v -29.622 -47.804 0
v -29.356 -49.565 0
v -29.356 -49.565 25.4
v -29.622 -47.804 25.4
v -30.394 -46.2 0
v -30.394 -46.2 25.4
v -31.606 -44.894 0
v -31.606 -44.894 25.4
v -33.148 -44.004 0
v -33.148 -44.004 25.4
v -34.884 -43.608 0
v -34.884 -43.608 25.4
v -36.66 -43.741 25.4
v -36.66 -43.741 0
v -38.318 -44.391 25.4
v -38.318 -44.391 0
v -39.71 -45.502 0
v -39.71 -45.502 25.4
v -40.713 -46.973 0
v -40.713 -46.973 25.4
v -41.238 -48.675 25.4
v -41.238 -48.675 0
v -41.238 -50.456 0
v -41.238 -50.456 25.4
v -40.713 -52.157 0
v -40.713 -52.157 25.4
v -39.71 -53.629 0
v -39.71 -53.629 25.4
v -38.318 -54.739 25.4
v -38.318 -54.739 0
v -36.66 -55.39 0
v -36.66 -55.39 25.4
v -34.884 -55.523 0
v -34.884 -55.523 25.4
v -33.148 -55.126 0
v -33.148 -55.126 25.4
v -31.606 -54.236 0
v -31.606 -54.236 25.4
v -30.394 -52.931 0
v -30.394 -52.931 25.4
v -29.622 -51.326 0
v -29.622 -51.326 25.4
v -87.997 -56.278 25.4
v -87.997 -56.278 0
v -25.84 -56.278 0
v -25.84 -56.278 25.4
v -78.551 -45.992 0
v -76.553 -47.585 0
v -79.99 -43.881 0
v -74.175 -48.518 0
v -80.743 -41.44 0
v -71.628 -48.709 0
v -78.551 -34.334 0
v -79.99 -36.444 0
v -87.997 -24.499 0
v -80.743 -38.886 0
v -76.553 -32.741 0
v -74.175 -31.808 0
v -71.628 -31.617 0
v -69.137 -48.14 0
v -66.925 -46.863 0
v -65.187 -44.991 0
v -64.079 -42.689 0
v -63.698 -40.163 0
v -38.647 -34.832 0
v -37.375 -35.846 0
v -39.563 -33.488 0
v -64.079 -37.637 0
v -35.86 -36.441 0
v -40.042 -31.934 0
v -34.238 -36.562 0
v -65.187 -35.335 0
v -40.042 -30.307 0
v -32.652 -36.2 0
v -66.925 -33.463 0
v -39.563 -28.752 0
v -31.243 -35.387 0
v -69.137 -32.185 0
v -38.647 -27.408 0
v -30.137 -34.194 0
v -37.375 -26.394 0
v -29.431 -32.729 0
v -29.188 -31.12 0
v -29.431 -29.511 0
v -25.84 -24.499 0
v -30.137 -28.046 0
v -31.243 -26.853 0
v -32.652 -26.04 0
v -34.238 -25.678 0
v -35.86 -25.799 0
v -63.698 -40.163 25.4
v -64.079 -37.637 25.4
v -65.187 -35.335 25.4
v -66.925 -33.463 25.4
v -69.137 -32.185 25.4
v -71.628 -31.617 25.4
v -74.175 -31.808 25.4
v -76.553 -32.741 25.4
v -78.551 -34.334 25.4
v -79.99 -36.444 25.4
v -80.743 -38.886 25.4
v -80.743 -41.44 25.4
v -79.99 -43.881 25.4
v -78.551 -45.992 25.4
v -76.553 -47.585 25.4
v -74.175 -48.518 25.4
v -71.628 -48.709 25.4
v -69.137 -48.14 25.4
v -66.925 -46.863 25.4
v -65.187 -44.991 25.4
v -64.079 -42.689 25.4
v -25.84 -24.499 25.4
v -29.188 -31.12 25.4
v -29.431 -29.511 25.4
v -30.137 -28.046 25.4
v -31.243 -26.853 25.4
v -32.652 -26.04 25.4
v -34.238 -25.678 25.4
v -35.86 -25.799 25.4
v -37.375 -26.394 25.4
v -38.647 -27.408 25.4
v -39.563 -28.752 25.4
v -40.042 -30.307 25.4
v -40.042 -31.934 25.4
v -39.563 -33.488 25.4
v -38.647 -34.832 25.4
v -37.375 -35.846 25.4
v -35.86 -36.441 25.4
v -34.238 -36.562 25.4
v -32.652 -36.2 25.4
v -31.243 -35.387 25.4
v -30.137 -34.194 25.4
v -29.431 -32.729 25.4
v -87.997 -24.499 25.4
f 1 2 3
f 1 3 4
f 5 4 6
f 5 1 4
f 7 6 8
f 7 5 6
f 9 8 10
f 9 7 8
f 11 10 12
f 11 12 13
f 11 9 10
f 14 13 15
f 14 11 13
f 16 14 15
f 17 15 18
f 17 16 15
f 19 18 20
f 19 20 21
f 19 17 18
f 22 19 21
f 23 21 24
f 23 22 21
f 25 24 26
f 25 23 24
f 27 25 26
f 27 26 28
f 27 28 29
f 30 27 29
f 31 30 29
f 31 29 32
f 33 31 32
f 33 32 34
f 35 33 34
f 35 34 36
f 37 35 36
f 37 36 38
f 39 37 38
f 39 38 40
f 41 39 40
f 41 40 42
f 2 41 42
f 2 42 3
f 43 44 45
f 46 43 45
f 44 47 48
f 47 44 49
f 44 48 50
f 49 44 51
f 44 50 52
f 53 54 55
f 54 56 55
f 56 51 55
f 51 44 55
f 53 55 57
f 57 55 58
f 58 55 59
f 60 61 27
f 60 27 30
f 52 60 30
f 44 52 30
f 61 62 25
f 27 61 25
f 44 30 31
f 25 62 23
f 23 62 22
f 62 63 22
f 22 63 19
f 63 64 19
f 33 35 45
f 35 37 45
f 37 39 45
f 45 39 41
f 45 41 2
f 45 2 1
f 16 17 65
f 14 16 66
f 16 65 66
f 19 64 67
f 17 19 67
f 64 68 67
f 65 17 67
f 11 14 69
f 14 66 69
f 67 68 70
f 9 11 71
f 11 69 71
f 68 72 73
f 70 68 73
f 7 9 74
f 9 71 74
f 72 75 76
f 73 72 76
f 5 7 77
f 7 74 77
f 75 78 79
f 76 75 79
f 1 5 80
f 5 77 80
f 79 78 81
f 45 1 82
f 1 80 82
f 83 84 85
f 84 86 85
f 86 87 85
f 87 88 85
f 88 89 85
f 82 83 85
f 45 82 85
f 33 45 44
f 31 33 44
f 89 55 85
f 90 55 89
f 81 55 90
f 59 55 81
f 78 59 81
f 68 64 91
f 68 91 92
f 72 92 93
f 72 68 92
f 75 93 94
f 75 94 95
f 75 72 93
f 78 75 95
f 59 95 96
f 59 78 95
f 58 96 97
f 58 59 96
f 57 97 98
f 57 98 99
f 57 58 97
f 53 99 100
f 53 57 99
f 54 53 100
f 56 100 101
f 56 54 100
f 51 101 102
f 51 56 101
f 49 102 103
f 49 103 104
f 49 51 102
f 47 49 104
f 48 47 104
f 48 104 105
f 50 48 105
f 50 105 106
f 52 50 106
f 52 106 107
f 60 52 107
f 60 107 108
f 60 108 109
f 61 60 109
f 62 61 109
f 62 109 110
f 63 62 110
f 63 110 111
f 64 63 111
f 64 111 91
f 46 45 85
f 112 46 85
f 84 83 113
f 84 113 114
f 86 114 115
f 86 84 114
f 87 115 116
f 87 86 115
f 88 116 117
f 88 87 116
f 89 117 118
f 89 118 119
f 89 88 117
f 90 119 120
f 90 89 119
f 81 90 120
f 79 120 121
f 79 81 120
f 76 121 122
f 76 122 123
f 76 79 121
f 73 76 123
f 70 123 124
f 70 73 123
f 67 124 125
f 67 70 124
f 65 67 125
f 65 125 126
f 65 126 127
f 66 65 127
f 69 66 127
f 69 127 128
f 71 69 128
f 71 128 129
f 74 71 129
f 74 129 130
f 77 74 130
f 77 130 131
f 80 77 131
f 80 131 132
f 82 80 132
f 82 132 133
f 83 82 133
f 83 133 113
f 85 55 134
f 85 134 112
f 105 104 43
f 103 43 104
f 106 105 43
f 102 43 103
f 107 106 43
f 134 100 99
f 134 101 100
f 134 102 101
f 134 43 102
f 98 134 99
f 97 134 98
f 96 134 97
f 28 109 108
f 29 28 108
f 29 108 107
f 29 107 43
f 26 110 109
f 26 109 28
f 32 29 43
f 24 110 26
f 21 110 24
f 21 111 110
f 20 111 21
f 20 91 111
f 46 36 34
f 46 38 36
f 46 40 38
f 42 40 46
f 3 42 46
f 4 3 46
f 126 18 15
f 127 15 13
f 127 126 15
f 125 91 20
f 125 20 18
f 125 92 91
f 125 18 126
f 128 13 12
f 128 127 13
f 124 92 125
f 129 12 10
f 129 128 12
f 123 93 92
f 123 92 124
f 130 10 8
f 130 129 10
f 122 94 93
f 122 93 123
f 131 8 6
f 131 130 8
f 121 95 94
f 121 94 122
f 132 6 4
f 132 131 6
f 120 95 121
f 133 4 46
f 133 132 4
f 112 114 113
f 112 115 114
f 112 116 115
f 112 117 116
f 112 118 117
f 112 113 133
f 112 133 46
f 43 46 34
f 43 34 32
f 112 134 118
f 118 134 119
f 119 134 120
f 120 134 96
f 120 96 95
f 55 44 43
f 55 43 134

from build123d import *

# Parameters (mm, degrees)
F0_W     = 62.156647
F0_H     = 31.778897
F0_R     = 5.974125
F0_R_2   = 8.570031
F0_R_3   = 5.457517
F1_DEPTH = 6.35
F2_DEPTH = 25.4


with BuildPart() as f1:
    # F0 (on Top) → F1 (new body)
    with BuildSketch(Plane.XY):
        with Locations((-56.918233, -40.388333)):
            Rectangle(F0_W, F0_H)
        with Locations((-35.330459, -49.565207)):
            Circle(F0_R, mode=Mode.SUBTRACT)
        with Locations((-72.268285, -40.162876)):
            Circle(F0_R_2, mode=Mode.SUBTRACT)
        with Locations((-34.6459, -31.120101)):
            Circle(F0_R_3, mode=Mode.SUBTRACT)
    extrude(amount=F1_DEPTH)

    # F0 (on Top) → F2 (join)
    with BuildSketch(Plane.XY):
        with Locations((-56.918233, -40.388333)):
            Rectangle(F0_W, F0_H)
        with Locations((-35.330459, -49.565207)):
            Circle(F0_R, mode=Mode.SUBTRACT)
        with Locations((-72.268285, -40.162876)):
            Circle(F0_R_2, mode=Mode.SUBTRACT)
        with Locations((-34.6459, -31.120101)):
            Circle(F0_R_3, mode=Mode.SUBTRACT)
    extrude(amount=F2_DEPTH)


solid = f1.part
